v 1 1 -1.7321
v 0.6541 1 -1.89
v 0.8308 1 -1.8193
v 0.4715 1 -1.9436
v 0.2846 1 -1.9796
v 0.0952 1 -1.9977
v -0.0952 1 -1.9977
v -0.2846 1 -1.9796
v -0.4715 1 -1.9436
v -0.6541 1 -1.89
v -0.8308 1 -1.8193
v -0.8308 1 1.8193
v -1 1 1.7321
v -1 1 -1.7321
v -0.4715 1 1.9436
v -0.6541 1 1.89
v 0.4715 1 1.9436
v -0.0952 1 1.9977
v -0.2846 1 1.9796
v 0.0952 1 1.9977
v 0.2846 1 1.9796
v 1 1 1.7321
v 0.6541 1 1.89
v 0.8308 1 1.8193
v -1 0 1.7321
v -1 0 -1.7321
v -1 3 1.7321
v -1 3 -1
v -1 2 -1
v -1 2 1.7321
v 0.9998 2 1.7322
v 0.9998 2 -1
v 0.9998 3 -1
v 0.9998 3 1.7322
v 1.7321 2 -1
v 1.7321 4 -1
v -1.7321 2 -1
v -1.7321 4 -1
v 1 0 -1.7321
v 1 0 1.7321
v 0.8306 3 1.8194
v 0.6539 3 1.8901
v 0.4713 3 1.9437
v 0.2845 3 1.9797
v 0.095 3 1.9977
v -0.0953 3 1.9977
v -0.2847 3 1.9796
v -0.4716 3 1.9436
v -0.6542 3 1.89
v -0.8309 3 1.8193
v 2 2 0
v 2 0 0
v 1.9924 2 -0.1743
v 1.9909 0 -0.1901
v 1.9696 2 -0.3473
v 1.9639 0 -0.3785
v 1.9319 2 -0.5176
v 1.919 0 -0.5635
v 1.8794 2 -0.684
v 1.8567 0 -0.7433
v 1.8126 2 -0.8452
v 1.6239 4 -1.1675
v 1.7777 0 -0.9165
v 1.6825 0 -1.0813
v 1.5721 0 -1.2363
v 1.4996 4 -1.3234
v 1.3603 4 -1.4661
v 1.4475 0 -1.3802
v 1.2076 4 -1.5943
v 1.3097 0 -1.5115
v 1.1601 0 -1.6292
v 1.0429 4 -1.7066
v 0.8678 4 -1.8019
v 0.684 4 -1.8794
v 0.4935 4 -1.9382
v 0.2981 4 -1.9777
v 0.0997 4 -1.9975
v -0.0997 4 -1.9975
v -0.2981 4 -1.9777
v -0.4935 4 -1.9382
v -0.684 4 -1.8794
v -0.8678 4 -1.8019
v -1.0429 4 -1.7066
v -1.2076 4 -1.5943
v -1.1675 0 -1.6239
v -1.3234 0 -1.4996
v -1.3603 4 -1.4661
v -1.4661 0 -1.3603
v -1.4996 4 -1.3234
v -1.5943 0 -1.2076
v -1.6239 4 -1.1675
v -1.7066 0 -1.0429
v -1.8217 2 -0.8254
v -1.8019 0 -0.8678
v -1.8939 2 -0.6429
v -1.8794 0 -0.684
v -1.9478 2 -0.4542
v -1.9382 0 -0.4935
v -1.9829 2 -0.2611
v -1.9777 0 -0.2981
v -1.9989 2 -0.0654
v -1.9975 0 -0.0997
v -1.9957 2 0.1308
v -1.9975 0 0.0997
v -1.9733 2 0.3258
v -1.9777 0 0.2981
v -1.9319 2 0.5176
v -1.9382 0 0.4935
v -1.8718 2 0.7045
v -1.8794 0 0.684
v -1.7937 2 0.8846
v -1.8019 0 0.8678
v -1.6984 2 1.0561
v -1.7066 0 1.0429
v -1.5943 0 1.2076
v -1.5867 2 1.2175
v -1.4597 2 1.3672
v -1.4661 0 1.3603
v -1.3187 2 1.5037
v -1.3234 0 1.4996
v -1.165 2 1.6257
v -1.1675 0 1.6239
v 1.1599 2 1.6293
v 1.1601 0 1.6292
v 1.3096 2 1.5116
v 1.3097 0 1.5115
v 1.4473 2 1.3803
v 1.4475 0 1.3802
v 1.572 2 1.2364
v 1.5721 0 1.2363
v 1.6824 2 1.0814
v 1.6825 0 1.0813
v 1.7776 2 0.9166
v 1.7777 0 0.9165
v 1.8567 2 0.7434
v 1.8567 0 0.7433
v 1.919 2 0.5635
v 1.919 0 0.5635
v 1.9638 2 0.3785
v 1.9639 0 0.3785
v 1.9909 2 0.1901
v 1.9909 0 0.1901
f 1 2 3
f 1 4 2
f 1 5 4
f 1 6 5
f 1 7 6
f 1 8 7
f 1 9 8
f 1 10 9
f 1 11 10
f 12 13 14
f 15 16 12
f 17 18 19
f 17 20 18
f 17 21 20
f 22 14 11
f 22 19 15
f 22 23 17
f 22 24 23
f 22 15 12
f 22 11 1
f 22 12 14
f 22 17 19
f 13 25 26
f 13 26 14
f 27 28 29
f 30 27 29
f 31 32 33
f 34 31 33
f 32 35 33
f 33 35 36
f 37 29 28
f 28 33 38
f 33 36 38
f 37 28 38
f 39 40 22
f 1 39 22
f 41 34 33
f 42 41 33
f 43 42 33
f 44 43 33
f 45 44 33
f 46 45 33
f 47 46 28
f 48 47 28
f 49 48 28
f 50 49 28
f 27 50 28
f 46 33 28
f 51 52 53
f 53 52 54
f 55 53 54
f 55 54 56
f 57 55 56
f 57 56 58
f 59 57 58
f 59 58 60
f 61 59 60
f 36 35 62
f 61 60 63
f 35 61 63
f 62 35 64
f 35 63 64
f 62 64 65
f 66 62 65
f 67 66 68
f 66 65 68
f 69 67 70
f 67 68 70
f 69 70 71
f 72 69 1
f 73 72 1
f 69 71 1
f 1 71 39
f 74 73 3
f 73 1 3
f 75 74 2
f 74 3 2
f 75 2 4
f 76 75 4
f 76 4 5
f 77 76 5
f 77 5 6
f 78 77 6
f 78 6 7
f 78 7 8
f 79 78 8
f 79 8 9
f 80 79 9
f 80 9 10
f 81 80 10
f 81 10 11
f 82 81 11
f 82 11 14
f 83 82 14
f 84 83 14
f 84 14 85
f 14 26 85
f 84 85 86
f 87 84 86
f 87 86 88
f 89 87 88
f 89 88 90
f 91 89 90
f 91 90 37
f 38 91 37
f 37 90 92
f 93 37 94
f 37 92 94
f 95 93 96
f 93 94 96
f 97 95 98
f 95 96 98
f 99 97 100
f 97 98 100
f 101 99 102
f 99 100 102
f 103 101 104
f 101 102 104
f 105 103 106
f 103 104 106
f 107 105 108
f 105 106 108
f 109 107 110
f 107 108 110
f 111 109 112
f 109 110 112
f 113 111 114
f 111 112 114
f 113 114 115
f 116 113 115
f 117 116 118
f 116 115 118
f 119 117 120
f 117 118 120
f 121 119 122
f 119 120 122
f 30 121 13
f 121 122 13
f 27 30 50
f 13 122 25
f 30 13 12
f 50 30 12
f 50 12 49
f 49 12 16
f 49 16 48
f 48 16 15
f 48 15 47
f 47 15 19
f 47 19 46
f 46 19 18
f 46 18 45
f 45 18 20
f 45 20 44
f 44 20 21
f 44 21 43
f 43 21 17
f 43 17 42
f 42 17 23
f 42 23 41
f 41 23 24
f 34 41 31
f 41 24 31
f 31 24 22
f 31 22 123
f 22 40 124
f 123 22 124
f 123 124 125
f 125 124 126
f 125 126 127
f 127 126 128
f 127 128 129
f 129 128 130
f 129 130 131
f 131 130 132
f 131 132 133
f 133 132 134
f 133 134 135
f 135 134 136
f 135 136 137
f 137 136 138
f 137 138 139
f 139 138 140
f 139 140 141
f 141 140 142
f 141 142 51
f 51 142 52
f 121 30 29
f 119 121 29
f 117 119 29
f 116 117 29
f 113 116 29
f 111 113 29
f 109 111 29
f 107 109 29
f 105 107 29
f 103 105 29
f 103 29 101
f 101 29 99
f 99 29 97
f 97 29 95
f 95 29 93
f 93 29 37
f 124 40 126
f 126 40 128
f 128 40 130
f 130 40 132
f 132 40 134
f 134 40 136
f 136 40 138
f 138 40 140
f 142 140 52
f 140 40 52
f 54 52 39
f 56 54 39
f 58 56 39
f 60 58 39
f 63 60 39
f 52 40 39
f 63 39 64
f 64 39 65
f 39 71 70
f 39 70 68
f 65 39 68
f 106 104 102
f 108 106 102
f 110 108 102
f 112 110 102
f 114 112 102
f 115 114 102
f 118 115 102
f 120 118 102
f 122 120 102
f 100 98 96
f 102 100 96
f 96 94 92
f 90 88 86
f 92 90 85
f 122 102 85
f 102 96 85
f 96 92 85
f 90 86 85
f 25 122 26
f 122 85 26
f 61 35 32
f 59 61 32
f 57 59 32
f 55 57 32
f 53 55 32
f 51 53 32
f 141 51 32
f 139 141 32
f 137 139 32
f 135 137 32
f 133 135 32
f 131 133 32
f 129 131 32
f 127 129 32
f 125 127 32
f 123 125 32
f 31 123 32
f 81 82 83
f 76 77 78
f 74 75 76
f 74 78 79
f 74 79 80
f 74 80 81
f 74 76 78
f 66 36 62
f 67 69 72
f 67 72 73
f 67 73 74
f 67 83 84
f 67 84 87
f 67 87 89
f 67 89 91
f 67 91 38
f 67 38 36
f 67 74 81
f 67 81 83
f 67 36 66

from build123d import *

# Parameters (mm, degrees)
SKETCH1_R               = 2
BOSS_EXTRUDE1_DEPTH     = 4
SKETCH2_W               = 2
SKETCH2_H               = 1
CUT_EXTRUDE1_DEPTH      = 2
CUT_EXTRUDE2_DEPTH      = 4
CUT_EXTRUDE2_DEPTH_BACK = 1


with BuildPart() as part:
    # Sketch1 → Boss-Extrude1 (new body)
    with BuildSketch(Plane(origin=(0, 0, 0), x_dir=(1, 0, 0), z_dir=(0, 1, 0))):
        Circle(SKETCH1_R)
    extrude(amount=BOSS_EXTRUDE1_DEPTH)

    # Sketch2 → Cut-Extrude1 (cut, symmetric)
    with BuildSketch(Plane.XY):
        with Locations((0, 0.5)):
            Rectangle(SKETCH2_W, SKETCH2_H)
    extrude(amount=CUT_EXTRUDE1_DEPTH, both=True, mode=Mode.SUBTRACT)

    # Sketch3 → Cut-Extrude2 (cut, two sides)
    with BuildSketch(Plane.XY) as cut_extrude2_sk:
        Polygon((-2, 4), (2, 4), (2, 3), (2, 2), (0.999776138, 2), (0.999776138, 3), (-1, 3), (-1, 2), (-2, 2), align=None)
    extrude(amount=CUT_EXTRUDE2_DEPTH, mode=Mode.SUBTRACT)
    extrude(cut_extrude2_sk.sketch, amount=-CUT_EXTRUDE2_DEPTH_BACK, mode=Mode.SUBTRACT)


solid = part.part
